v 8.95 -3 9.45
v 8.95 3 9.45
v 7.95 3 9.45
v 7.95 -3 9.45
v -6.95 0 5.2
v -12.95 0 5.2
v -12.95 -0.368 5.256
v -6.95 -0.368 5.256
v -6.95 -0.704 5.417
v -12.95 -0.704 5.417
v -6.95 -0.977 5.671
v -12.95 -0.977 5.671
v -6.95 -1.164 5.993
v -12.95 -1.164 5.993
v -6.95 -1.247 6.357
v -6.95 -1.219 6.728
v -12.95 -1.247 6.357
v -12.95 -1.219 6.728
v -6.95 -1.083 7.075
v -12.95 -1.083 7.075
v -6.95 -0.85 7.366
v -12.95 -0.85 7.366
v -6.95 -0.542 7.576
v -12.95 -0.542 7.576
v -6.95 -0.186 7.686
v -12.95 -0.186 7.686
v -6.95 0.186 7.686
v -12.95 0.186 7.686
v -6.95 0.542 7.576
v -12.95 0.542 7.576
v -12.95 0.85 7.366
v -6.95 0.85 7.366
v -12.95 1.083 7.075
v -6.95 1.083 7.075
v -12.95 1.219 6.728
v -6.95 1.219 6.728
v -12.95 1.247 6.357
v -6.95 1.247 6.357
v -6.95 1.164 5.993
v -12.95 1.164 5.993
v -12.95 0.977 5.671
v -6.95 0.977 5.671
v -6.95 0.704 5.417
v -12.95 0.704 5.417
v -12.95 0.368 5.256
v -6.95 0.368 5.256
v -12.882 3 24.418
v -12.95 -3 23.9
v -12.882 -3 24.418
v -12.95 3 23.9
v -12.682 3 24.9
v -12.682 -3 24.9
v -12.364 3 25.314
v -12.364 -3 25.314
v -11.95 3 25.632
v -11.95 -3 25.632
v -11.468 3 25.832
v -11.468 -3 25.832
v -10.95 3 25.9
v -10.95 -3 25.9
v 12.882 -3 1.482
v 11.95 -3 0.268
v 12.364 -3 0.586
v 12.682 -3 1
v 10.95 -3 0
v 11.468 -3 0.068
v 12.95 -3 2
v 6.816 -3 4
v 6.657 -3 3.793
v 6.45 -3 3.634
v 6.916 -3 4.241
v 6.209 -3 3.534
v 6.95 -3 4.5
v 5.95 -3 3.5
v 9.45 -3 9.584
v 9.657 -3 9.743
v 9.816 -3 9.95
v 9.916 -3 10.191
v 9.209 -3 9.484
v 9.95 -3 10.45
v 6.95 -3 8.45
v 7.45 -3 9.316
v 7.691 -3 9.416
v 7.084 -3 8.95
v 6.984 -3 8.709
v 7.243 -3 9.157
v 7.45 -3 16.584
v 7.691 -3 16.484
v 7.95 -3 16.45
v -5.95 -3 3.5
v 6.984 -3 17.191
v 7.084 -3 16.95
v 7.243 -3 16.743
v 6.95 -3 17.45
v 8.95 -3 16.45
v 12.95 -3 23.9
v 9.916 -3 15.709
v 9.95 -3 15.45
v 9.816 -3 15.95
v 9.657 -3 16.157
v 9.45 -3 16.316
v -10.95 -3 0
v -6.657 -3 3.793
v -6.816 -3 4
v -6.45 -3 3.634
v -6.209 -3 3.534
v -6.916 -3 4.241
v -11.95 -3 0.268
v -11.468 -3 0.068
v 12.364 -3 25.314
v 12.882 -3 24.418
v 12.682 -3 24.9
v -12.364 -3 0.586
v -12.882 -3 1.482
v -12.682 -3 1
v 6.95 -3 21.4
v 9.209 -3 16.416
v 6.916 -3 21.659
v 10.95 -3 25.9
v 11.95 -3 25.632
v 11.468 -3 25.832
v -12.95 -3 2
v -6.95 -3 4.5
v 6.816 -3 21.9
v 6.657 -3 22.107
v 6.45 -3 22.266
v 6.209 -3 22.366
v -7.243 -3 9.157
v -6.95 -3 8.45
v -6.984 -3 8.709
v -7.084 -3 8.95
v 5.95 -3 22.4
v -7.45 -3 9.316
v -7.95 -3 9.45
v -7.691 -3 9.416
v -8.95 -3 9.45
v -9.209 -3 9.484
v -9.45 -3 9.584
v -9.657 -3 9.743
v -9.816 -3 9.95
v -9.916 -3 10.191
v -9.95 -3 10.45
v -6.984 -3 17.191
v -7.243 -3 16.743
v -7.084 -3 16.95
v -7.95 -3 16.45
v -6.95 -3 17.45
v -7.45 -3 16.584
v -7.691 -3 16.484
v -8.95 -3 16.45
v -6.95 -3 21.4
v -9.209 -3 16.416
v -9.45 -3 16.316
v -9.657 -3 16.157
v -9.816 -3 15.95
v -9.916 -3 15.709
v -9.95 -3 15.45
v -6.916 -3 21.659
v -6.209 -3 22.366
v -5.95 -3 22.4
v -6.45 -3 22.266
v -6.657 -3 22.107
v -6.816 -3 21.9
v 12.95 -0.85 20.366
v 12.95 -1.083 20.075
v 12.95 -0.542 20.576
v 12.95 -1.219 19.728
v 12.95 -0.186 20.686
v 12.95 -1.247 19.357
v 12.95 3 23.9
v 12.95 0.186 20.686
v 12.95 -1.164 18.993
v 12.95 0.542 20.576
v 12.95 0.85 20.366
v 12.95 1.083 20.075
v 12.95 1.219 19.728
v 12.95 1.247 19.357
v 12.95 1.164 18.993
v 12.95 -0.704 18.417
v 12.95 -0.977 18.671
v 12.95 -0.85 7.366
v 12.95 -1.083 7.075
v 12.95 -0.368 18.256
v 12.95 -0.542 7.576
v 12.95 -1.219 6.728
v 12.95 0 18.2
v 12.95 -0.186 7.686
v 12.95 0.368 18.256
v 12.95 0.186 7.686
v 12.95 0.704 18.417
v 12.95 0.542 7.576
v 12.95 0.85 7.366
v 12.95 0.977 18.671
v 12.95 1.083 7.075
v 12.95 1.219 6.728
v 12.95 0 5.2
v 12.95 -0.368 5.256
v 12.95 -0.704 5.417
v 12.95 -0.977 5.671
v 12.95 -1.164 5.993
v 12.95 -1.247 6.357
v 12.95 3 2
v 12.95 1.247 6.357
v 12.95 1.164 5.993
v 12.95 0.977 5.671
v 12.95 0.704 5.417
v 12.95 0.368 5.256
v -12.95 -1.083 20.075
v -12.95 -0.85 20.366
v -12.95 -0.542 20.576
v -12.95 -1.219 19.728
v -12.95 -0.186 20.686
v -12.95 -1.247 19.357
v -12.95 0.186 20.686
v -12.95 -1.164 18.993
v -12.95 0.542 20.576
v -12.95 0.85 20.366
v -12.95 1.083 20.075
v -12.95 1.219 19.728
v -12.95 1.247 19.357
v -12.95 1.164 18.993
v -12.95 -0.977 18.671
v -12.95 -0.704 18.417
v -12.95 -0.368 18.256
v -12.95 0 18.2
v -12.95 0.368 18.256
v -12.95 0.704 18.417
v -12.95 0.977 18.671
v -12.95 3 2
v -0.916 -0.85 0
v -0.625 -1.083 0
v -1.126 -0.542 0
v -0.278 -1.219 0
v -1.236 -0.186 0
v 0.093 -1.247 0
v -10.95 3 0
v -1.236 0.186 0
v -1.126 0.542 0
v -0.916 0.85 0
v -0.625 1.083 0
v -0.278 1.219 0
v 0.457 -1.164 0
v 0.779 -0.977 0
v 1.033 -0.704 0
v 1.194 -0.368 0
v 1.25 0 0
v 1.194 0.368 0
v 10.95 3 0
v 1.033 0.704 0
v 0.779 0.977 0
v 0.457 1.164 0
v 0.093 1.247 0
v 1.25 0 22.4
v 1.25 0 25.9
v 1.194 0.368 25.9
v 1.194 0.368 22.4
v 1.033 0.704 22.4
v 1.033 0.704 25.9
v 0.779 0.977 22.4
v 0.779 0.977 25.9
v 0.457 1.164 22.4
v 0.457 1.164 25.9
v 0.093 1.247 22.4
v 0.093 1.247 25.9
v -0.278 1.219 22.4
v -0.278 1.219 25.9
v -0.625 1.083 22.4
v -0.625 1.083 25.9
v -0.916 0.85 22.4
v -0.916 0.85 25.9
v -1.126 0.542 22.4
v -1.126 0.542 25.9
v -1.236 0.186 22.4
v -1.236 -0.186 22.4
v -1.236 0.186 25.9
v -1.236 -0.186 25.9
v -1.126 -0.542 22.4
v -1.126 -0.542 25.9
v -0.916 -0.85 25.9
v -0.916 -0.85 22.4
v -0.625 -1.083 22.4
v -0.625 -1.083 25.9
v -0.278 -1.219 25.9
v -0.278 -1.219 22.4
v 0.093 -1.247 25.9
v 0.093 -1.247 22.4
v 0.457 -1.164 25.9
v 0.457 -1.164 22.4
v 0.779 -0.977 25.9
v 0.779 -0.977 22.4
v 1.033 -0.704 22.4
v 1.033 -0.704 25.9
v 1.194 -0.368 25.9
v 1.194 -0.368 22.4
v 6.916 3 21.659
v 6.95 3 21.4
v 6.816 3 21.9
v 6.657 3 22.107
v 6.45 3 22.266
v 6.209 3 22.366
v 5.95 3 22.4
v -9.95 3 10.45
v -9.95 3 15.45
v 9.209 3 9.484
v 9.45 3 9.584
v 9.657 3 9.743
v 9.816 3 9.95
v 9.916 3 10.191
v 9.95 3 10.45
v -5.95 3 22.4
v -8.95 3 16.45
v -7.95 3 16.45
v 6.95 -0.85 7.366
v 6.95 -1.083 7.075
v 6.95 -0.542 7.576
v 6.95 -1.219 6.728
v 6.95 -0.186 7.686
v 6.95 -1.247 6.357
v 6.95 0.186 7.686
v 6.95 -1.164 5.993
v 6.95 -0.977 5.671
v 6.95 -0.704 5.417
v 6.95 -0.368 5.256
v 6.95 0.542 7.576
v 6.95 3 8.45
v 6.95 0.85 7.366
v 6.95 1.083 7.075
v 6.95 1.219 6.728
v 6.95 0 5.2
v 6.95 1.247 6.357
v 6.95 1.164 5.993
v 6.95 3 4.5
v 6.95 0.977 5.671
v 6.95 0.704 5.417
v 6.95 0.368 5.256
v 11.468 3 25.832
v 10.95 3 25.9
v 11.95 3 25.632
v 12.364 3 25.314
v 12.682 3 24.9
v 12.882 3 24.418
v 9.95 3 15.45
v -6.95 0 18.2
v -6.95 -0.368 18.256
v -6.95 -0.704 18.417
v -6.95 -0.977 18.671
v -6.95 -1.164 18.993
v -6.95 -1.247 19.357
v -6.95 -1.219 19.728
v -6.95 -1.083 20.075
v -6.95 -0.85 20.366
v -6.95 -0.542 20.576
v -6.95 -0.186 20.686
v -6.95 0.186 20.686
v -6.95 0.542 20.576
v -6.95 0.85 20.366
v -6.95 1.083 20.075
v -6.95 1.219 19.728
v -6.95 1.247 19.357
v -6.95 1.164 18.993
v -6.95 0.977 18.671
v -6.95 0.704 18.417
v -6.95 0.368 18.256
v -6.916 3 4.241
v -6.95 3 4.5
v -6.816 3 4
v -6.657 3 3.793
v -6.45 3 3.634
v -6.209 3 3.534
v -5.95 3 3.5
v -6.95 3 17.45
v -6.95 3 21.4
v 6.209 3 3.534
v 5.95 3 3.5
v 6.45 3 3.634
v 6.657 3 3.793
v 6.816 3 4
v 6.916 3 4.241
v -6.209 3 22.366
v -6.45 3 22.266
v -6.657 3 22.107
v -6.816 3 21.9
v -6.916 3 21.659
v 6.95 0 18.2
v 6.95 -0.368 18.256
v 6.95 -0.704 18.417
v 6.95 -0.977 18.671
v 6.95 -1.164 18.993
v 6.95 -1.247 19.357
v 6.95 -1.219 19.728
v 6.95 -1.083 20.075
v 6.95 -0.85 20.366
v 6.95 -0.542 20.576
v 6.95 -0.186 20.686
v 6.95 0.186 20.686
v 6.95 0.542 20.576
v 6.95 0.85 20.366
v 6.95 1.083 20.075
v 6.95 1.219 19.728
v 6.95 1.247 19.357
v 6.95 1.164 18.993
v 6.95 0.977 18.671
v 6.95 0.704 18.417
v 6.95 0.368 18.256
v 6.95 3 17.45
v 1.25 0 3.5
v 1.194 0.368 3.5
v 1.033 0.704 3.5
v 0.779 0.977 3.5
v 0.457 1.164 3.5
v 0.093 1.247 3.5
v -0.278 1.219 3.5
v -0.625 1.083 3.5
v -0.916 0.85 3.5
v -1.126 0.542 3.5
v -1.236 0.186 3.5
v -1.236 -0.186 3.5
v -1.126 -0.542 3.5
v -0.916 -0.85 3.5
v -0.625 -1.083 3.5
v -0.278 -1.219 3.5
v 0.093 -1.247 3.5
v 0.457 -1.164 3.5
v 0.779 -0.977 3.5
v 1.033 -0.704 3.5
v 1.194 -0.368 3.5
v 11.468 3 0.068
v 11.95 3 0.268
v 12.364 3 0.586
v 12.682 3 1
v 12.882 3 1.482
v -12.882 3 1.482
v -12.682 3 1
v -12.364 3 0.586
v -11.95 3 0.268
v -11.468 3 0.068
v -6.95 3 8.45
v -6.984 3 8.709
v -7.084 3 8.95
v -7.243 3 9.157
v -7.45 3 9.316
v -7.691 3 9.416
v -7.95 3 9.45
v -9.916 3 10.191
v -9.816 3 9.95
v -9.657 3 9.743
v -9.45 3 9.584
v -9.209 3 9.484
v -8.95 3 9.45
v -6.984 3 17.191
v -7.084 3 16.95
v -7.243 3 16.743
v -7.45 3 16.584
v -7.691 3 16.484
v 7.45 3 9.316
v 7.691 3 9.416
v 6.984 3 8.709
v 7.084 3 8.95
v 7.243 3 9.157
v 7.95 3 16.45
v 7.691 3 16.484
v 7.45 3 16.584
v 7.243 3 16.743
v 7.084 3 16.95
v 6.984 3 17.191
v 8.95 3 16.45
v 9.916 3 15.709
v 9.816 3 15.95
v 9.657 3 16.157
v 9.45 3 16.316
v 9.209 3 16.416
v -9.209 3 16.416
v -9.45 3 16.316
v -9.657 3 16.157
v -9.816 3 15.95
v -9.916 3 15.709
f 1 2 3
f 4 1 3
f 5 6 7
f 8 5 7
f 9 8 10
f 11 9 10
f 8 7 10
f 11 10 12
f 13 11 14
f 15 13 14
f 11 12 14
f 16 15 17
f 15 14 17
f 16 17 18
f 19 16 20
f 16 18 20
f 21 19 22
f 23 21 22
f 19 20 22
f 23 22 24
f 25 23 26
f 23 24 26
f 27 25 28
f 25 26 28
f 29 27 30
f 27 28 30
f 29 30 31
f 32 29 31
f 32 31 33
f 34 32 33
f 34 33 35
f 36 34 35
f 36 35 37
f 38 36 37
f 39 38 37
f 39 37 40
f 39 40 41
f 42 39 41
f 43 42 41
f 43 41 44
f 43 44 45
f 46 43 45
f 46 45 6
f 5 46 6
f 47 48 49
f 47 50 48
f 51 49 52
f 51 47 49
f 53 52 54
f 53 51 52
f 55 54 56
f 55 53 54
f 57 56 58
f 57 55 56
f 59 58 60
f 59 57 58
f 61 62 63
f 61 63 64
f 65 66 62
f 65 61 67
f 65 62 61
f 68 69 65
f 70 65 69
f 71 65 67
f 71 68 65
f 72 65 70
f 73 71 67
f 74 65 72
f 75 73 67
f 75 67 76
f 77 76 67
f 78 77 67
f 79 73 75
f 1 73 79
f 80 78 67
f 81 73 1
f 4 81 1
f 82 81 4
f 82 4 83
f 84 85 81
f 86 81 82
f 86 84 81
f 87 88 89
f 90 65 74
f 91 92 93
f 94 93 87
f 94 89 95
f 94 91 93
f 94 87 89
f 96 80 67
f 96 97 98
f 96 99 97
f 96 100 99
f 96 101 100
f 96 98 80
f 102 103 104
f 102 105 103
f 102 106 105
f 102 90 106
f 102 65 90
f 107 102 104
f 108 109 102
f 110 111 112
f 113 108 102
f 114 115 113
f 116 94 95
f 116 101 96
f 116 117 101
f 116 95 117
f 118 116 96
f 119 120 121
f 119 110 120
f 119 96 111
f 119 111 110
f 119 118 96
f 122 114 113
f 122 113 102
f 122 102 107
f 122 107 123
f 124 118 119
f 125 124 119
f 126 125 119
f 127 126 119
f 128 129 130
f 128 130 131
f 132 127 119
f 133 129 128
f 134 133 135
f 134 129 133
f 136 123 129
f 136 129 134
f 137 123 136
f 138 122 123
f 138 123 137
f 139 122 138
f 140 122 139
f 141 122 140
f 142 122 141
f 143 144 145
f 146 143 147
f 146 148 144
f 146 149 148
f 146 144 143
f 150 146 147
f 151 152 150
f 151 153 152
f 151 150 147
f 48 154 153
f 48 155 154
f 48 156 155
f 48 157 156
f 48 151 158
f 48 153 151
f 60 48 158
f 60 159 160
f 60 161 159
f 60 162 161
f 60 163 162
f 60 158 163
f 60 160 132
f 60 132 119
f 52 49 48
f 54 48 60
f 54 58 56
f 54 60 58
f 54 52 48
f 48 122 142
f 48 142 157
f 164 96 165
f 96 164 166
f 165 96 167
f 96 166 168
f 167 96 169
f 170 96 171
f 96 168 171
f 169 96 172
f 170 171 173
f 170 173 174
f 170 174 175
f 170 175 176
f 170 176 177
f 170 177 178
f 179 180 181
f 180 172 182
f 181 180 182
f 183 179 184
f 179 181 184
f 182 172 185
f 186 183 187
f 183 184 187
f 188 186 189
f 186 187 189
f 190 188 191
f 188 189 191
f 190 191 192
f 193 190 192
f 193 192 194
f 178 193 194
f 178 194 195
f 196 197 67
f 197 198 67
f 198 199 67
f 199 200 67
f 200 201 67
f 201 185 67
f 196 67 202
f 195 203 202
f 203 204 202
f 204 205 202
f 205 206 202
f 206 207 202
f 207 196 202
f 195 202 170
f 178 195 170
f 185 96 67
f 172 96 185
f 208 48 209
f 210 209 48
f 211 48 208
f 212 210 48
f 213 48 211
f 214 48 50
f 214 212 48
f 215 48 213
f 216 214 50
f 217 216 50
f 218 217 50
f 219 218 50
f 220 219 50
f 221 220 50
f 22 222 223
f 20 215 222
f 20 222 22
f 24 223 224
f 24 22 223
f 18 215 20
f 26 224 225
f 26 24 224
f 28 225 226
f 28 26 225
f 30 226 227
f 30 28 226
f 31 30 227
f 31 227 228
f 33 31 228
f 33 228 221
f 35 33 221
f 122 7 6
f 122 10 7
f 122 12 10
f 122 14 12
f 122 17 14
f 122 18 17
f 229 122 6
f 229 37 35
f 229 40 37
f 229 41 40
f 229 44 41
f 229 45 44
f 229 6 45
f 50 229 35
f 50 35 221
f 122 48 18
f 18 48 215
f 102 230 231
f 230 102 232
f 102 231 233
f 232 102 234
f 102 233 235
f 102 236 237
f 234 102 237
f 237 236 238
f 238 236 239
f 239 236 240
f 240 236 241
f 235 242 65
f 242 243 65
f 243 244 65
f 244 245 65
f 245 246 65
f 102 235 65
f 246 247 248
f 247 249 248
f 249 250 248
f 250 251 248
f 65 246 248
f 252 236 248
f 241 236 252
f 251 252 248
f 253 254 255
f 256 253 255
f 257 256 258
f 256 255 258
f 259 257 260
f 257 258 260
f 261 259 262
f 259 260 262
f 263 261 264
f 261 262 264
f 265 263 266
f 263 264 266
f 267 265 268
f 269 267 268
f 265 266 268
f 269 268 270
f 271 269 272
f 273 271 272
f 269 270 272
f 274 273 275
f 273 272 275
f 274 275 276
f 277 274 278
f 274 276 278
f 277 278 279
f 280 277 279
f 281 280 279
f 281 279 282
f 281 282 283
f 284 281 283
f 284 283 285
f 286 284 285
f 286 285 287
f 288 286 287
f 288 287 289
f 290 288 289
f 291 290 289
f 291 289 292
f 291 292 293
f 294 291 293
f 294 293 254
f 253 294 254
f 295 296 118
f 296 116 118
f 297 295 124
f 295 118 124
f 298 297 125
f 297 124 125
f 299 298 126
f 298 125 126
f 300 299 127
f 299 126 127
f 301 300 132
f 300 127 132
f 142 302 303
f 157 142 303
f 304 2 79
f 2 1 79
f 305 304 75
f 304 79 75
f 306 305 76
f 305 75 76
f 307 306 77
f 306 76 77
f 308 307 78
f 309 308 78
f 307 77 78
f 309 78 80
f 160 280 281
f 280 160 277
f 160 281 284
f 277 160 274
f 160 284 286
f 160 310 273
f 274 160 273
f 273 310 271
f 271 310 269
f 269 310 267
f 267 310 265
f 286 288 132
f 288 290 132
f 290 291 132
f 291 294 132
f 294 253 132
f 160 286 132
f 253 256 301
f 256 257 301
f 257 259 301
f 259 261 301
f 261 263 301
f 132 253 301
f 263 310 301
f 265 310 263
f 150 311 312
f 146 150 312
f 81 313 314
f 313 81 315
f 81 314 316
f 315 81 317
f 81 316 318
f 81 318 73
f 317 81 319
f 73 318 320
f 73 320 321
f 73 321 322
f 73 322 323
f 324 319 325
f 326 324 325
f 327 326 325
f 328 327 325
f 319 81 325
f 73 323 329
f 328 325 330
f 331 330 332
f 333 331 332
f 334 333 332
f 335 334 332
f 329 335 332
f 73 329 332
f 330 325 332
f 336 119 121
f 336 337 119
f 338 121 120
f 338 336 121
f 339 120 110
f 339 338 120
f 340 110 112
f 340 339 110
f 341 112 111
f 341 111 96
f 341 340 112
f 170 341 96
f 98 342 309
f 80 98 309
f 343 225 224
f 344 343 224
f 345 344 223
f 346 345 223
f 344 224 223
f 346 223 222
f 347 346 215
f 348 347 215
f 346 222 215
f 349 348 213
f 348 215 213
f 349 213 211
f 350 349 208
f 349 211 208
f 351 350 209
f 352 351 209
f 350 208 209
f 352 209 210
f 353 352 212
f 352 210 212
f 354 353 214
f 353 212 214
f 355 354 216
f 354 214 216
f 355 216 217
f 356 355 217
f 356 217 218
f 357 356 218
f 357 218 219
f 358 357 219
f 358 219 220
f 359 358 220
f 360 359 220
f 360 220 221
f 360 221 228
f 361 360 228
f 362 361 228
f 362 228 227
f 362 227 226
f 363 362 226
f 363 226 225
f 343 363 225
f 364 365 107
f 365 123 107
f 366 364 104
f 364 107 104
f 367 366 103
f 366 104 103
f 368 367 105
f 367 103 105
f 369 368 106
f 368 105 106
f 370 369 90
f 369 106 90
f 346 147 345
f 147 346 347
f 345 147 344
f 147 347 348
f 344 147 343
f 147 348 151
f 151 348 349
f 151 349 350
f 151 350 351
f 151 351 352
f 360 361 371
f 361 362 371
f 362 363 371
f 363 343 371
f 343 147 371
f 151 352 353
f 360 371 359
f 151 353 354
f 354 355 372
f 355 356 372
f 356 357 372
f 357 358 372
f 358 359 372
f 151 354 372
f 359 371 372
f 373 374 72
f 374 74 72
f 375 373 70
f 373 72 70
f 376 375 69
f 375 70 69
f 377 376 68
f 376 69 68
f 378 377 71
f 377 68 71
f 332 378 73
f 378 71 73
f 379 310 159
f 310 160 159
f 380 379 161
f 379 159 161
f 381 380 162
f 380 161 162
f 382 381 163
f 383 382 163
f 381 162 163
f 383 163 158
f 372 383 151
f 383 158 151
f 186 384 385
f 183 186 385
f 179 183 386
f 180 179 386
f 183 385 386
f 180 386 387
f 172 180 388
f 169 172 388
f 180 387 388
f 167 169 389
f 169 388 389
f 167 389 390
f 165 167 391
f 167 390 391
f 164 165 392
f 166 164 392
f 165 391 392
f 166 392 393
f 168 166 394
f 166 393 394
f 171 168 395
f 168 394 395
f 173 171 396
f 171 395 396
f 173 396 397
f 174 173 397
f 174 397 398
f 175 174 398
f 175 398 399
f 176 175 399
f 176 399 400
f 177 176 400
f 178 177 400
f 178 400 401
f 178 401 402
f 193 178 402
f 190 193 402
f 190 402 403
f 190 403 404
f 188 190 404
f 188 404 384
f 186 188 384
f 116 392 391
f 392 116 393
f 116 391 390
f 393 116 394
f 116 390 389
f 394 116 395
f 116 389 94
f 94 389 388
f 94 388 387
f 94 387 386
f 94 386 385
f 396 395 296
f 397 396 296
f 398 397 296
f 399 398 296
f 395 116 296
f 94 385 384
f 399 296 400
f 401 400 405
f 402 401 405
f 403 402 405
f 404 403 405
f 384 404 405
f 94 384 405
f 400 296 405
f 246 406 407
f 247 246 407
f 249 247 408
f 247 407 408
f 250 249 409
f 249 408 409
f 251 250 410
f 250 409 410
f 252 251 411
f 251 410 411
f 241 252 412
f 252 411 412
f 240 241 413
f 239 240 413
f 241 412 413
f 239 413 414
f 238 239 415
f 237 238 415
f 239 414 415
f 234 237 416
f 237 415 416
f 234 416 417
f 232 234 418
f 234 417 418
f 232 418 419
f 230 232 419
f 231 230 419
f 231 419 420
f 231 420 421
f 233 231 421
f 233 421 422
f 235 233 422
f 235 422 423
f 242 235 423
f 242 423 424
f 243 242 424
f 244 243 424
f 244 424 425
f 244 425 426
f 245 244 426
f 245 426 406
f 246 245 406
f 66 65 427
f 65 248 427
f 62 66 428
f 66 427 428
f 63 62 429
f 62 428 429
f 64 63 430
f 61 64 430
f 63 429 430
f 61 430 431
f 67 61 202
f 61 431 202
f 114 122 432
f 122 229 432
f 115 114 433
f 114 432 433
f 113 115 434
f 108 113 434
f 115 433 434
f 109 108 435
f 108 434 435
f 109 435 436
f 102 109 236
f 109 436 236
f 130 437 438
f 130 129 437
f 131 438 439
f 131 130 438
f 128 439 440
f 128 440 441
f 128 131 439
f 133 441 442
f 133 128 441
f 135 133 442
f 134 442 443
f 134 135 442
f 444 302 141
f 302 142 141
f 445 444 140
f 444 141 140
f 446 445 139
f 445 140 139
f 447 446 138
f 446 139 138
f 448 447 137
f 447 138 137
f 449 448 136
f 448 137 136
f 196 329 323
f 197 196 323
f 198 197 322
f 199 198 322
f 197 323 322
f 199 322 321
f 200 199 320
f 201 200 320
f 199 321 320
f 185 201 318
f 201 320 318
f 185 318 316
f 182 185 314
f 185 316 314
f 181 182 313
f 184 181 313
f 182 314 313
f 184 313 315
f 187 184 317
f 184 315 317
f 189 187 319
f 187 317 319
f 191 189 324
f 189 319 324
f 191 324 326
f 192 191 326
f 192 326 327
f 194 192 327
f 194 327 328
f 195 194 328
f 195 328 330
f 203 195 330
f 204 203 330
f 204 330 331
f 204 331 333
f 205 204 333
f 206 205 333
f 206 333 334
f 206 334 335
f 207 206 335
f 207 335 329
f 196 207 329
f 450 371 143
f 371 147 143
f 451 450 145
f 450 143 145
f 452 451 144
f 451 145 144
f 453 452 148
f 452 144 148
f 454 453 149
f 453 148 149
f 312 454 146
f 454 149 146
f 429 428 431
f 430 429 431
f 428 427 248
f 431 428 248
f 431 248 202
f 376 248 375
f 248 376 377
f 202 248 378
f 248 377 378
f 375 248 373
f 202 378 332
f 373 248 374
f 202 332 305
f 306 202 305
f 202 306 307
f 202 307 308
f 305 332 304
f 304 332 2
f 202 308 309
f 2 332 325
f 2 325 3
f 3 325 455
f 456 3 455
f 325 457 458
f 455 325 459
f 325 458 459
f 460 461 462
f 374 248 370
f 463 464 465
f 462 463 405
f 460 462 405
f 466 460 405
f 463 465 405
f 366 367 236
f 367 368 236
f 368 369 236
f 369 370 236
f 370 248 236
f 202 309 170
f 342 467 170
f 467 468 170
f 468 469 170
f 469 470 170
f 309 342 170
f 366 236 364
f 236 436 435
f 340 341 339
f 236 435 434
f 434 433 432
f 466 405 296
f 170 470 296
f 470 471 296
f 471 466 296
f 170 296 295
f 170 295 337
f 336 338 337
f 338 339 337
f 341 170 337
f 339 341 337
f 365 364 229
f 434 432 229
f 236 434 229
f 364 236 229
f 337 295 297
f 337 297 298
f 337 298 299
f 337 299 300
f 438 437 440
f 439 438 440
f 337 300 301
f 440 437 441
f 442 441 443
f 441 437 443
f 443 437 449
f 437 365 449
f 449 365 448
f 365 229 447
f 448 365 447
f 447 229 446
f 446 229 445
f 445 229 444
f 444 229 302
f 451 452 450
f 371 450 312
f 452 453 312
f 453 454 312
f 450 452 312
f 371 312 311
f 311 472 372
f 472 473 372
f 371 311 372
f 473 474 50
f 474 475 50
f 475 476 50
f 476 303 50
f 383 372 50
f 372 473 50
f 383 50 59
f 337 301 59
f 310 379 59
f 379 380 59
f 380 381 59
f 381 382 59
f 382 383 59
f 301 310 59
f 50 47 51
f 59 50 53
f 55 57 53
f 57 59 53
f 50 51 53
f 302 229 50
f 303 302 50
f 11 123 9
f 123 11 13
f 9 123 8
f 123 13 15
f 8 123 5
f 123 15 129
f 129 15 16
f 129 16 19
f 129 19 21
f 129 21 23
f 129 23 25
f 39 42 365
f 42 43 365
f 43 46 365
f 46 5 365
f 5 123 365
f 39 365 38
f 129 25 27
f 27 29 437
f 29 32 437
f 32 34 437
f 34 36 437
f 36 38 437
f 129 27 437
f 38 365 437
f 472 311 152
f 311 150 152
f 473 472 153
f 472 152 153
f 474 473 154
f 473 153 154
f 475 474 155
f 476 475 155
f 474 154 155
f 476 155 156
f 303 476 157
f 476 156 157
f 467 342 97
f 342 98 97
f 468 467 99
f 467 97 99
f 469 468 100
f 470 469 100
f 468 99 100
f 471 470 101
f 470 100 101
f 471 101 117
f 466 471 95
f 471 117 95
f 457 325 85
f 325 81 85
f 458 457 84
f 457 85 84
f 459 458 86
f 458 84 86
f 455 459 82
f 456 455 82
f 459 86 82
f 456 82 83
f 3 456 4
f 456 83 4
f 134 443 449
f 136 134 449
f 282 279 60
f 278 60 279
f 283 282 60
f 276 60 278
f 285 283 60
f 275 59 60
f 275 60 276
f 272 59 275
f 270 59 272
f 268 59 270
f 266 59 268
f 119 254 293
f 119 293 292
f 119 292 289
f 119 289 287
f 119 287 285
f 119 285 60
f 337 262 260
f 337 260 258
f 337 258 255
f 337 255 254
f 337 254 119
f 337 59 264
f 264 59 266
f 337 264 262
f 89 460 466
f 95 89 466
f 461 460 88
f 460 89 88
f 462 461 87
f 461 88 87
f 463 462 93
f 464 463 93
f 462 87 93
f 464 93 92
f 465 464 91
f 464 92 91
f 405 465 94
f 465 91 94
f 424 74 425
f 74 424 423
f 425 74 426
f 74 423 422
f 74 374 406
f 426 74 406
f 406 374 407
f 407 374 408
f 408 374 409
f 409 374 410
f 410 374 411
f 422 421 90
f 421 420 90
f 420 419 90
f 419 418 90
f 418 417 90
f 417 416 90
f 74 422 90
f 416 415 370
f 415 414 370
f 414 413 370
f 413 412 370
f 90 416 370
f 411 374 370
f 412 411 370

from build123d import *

# Parameters (mm, degrees)
SKETCH_1_W                   = 25.9
SKETCH_1_H                   = 25.9
EXTRUDE_1_DEPTH              = 25.9
HOLE_WIZARD_M3_1_D           = 2.5
SKETCH_7_W                   = 25.9
SKETCH_7_H                   = 9.95
CUT_EXTRUDE_4_DEPTH          = 26.9
FILLET_1_R                   = 2
CUT_EXTRUDE_5_DEPTH          = 1
CUT_EXTRUDE_5_DEPTH_BACK     = 7
FILLET_3_R                   = 1
HOLE_WIZARD_M3_2_D           = 2.5
HOLE_WIZARD_M3_2_ON_FACE_2_D = 2.5


with BuildPart() as part:
    # 草图1 → 凸台-拉伸1 (new body)
    with BuildSketch(Plane.XY):
        Rectangle(SKETCH_1_W, SKETCH_1_H)
    extrude(amount=EXTRUDE_1_DEPTH)

    # M3 螺纹孔1 (through all)
    with Locations(Plane(origin=(12.95, 0, 19.45), x_dir=(0, 0, 1), z_dir=(1, 0, 0))):
        with Locations((0, 0), (-13, 0)):
            Hole(HOLE_WIZARD_M3_1_D / 2)

    # 草图7 → 切除-拉伸4 (cut, through all)
    with BuildSketch(Plane.ZY.offset(12.95)):
        with Locations((12.95, 7.975)):
            Rectangle(SKETCH_7_W, SKETCH_7_H)
        with Locations((12.95, -7.975)):
            Rectangle(SKETCH_7_W, SKETCH_7_H)
    extrude(amount=-CUT_EXTRUDE_4_DEPTH, mode=Mode.SUBTRACT)

    # 圆角1
    fillet_1_edges = [part.edges().sort_by_distance(p)[0] for p in [
        (12.95, 0, 0),
        (-12.95, 0, 0),
        (12.95, 0, 25.9),
        (-12.95, 0, 25.9),
    ]]
    fillet(fillet_1_edges, radius=FILLET_1_R)

    # 草图8 → 切除-拉伸5 (cut, two sides)
    with BuildSketch(Plane(origin=(0, 3, 0), x_dir=(1, 0, 0), z_dir=(0, 1, 0))) as cut_extrude_5_sk:
        Polygon((-6.95, -9.45), (-9.95, -9.45), (-9.95, -16.45), (-6.95, -16.45), (-6.95, -22.4), (6.95, -22.4), (6.95, -16.45), (9.95, -16.45), (9.95, -9.45), (6.95, -9.45), (6.95, -3.5), (-6.95, -3.5), align=None)
    extrude(amount=CUT_EXTRUDE_5_DEPTH, mode=Mode.SUBTRACT)
    extrude(cut_extrude_5_sk.sketch, amount=-CUT_EXTRUDE_5_DEPTH_BACK, mode=Mode.SUBTRACT)

    # 圆角3
    fillet_3_edges = [part.edges().sort_by_distance(p)[0] for p in [
        (6.95, 0, 16.45),
        (-6.95, 0, 22.4),
        (-9.95, 0, 16.45),
        (-9.95, 0, 9.45),
        (-6.95, 0, 3.5),
        (6.95, 0, 9.45),
        (9.95, 0, 9.45),
        (9.95, 0, 16.45),
        (6.95, 0, 22.4),
        (-6.95, 0, 16.45),
        (-6.95, 0, 9.45),
        (6.95, 0, 3.5),
    ]]
    fillet(fillet_3_edges, radius=FILLET_3_R)

    # M3 螺纹孔2 (through all)
    with Locations(Plane(origin=(0, 0, 0), x_dir=(-1, 0, 0), z_dir=(0, 0, -1))):
        with Locations((0, 0)):
            Hole(HOLE_WIZARD_M3_2_D / 2)

    # M3 螺纹孔2 on face 2 (through all)
    with Locations(Plane.XY.offset(25.9)):
        with Locations((0, 0)):
            Hole(HOLE_WIZARD_M3_2_ON_FACE_2_D / 2)


solid = part.part
